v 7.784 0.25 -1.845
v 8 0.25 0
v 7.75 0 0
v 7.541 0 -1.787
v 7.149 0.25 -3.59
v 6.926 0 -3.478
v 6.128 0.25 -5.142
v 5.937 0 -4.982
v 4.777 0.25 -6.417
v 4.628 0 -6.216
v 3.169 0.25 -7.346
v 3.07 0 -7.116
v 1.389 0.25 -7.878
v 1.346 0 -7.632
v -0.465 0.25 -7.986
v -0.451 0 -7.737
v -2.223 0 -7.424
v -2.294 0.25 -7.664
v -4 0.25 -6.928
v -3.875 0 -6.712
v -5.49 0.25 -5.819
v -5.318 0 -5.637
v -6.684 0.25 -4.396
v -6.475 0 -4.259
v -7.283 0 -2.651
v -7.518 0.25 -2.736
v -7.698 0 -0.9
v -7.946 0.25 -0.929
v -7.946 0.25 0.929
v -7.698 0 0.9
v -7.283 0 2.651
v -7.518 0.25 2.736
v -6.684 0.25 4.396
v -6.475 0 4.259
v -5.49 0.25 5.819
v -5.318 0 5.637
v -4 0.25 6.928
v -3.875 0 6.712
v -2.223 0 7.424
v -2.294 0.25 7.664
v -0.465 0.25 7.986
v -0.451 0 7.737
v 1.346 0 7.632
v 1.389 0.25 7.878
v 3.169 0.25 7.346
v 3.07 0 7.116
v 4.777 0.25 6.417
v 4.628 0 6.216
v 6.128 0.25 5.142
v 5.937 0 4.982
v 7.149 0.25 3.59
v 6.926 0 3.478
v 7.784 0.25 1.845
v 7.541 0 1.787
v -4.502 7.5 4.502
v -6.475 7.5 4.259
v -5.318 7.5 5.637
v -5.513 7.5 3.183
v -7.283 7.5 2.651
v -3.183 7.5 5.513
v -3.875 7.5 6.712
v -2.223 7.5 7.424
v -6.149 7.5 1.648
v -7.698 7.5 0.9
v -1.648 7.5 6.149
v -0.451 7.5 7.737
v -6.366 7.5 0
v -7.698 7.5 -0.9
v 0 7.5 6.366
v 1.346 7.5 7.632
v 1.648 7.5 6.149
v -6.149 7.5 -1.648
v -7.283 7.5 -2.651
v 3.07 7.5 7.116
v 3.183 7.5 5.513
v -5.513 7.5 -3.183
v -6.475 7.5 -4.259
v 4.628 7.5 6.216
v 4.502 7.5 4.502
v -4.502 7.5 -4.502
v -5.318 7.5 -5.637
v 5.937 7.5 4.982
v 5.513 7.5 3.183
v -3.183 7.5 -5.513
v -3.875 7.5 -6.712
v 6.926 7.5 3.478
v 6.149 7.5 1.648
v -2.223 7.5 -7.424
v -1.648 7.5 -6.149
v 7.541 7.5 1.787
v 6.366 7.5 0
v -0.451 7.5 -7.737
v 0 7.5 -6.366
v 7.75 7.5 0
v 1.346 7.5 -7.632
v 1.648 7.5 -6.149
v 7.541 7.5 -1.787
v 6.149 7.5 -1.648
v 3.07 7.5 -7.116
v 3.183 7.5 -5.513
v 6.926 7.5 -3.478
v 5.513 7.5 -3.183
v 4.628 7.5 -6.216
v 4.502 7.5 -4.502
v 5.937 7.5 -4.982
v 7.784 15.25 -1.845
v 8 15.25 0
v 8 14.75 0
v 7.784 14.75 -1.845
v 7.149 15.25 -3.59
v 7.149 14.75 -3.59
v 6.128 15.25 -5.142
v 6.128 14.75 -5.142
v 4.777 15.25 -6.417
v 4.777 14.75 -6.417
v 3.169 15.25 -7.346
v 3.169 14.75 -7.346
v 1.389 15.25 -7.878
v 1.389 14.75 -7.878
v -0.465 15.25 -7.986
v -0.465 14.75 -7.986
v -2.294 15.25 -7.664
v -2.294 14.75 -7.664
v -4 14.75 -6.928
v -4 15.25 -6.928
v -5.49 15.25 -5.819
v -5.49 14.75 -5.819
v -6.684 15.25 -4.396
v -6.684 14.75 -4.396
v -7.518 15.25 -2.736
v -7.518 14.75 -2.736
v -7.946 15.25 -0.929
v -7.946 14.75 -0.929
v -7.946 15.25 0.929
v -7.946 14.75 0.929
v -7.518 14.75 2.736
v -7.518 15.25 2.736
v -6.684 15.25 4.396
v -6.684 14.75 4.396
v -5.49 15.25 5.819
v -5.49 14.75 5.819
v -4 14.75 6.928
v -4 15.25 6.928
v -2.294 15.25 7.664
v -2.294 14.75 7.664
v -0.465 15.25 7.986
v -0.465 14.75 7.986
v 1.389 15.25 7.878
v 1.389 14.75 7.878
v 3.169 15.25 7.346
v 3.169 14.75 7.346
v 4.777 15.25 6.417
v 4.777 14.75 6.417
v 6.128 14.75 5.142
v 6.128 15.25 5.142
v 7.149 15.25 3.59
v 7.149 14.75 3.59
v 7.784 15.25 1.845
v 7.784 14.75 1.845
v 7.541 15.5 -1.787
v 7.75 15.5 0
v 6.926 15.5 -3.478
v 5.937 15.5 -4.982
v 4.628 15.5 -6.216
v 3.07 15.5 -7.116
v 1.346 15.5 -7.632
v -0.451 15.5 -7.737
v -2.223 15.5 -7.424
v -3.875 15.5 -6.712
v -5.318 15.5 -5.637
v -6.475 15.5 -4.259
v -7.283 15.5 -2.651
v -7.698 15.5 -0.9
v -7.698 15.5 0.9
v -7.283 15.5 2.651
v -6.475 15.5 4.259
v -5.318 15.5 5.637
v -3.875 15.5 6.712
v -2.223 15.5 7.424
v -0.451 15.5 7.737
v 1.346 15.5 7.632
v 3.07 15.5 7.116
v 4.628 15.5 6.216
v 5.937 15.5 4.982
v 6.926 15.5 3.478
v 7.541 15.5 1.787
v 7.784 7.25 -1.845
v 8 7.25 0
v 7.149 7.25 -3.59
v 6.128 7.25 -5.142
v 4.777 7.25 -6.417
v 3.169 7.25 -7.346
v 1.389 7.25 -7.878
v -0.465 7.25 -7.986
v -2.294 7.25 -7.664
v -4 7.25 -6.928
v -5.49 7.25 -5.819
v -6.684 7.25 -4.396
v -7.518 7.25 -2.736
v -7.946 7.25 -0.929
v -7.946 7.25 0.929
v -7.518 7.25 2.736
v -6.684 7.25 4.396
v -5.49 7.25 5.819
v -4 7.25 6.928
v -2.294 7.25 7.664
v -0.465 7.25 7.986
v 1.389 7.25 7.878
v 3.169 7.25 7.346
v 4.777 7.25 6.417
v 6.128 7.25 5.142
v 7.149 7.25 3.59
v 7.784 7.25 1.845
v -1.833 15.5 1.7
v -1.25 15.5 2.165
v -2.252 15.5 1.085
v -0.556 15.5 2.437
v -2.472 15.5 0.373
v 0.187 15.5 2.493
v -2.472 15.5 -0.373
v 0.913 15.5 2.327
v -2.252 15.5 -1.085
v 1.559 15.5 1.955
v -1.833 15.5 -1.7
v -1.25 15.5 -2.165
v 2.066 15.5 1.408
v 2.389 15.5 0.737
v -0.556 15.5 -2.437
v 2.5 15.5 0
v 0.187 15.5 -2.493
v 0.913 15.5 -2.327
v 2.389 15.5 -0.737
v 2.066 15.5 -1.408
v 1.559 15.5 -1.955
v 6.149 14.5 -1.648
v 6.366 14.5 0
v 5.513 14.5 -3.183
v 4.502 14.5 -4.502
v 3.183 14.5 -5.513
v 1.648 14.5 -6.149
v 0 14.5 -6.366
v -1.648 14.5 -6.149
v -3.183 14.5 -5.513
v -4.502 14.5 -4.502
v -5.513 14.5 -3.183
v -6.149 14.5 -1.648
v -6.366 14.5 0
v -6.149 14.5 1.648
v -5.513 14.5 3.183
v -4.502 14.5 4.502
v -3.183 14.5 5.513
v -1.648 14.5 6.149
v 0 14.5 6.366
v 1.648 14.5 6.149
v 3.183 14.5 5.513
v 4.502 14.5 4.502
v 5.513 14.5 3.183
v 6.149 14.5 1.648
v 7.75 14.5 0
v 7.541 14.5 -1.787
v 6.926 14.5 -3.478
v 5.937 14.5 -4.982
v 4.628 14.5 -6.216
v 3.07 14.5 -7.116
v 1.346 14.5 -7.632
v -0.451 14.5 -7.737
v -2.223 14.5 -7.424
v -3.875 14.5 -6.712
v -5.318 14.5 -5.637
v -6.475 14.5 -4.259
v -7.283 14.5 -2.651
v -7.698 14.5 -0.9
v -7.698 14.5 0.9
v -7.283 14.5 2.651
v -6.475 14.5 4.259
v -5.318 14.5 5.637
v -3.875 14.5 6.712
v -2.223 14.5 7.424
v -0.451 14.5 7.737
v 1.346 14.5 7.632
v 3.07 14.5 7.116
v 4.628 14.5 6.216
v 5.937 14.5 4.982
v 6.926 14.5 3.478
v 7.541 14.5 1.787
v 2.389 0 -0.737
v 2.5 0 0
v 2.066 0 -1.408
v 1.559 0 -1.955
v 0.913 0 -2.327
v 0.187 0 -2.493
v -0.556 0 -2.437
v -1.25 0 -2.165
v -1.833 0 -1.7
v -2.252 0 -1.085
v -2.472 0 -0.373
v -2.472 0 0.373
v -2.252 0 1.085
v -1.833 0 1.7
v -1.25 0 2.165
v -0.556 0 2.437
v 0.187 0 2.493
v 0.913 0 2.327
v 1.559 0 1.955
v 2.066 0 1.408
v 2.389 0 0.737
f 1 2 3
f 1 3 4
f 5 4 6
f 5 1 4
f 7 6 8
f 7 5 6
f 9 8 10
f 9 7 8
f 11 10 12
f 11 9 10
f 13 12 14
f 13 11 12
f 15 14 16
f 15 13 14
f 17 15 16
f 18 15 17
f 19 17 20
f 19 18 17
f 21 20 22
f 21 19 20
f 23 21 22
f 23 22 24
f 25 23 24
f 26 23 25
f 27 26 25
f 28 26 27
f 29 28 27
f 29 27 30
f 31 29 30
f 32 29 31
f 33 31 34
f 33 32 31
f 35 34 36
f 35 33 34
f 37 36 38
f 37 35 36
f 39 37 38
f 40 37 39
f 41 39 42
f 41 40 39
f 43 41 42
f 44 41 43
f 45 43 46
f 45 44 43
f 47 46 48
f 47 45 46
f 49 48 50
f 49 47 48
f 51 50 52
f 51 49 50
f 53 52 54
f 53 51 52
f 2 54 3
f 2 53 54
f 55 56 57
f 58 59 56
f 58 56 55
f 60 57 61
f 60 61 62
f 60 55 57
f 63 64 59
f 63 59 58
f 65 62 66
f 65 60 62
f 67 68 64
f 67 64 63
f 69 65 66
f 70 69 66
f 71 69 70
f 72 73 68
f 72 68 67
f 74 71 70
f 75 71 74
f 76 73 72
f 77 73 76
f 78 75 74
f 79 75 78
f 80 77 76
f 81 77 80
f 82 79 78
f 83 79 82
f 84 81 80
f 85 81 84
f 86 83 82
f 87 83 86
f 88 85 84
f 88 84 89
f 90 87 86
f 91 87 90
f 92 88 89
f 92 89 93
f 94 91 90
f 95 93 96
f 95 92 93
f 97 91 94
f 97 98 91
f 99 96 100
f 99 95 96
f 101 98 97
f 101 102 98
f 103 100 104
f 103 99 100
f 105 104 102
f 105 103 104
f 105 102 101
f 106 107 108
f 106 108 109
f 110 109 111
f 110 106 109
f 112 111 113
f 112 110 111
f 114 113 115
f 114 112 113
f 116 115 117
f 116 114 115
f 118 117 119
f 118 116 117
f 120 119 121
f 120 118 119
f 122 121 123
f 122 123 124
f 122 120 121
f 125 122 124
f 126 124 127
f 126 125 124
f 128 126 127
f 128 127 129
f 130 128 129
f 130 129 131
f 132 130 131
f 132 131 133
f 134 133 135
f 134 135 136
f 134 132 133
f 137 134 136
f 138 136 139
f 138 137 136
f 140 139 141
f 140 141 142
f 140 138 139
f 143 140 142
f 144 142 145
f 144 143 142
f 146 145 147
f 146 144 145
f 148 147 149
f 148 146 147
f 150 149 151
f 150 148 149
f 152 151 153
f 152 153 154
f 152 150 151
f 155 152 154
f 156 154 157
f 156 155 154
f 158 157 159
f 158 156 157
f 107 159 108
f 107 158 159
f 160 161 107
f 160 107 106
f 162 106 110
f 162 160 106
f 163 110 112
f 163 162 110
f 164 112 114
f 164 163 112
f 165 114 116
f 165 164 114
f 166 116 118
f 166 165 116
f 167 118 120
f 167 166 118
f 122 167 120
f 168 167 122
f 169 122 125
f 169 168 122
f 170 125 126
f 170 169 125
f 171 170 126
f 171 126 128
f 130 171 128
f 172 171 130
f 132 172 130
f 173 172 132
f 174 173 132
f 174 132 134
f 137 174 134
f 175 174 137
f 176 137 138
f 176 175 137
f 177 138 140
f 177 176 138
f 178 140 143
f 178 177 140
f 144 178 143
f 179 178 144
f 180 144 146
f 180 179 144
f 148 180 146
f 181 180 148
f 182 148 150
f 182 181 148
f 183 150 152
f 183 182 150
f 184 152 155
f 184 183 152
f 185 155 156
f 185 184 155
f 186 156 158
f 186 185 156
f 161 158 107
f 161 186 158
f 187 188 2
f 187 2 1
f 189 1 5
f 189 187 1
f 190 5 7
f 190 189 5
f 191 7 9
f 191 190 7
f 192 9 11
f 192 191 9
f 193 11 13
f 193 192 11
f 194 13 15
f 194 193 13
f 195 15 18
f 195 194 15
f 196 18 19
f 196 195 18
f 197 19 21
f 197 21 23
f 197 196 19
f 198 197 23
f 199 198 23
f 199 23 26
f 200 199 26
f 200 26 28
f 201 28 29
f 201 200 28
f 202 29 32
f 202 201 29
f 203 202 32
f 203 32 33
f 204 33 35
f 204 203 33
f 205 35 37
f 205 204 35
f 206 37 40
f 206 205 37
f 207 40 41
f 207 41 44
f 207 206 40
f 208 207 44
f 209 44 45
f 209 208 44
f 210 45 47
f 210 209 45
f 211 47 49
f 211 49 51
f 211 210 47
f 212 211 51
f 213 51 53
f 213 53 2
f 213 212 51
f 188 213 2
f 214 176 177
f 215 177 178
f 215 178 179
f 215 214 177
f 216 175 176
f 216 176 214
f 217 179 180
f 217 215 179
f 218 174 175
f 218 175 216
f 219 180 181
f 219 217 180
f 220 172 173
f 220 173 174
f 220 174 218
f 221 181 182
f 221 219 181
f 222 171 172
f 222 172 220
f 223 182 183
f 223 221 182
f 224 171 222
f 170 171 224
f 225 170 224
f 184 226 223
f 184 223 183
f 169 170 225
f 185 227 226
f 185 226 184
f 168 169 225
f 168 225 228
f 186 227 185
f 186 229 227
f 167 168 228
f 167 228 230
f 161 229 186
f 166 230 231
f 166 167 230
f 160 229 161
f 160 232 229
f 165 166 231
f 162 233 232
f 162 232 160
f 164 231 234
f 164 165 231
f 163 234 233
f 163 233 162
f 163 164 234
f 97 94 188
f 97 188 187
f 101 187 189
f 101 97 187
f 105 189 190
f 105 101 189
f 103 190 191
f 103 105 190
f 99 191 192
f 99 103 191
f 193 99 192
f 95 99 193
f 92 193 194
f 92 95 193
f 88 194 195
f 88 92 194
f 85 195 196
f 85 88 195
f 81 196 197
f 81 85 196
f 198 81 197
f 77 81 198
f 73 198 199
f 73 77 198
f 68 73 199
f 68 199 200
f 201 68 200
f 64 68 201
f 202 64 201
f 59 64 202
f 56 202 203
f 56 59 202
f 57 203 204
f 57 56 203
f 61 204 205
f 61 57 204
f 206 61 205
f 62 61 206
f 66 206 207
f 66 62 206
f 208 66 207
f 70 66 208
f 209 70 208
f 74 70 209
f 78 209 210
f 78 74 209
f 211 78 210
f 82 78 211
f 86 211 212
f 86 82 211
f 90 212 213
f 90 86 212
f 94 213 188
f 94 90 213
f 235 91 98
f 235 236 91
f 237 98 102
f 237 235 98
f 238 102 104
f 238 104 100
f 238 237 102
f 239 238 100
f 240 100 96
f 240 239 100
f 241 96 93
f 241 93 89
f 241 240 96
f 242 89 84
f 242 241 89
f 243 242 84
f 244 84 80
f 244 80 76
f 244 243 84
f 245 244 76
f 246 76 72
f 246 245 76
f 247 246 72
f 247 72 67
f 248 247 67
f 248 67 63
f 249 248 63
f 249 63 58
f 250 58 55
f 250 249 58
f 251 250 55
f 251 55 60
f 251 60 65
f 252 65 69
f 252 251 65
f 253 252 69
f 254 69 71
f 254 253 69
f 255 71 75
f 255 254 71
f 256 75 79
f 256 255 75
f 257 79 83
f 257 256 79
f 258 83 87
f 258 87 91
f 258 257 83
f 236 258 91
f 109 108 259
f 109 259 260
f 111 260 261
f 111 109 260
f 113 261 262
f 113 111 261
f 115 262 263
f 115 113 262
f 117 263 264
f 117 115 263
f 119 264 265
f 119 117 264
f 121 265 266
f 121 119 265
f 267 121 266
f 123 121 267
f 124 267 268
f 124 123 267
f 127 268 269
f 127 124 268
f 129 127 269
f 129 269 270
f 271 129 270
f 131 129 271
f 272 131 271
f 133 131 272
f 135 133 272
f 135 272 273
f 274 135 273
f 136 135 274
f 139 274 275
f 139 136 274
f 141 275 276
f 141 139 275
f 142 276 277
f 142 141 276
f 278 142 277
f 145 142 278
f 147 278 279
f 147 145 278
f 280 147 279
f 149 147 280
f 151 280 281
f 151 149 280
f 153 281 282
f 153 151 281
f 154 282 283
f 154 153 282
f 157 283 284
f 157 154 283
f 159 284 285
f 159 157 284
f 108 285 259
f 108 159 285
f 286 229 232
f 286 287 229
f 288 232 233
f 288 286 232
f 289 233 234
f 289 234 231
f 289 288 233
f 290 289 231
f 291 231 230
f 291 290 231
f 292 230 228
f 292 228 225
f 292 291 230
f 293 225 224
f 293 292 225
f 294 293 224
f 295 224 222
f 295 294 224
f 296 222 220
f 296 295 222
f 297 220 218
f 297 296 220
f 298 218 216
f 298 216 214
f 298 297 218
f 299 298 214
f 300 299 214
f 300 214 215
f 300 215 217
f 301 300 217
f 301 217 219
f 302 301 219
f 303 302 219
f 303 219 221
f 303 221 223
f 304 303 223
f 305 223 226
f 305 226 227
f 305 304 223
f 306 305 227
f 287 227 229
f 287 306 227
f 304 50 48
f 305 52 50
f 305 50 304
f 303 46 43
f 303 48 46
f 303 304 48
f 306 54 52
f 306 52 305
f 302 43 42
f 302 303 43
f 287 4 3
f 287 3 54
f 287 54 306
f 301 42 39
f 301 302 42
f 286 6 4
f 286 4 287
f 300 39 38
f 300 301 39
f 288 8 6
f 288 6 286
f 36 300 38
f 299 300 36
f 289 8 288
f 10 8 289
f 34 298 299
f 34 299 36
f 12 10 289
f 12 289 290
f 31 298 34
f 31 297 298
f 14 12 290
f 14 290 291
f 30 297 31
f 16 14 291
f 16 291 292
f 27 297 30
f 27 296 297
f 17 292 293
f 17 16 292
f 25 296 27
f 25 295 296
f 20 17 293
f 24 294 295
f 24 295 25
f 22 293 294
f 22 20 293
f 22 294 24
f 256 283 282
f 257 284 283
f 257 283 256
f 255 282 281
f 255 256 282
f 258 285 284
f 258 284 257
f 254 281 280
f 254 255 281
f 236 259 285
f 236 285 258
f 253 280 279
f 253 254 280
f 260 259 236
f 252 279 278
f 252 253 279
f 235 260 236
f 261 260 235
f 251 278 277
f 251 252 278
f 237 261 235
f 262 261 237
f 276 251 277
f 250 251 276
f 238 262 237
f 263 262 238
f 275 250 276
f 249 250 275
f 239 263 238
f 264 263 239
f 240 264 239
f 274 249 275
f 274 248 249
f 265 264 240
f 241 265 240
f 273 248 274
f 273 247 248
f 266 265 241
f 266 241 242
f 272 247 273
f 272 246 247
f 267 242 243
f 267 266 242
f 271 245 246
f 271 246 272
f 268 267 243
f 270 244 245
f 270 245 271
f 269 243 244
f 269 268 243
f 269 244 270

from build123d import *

# Parameters (mm, degrees)
CHAMFER1_SIZE = 0.25


with BuildPart() as part:
    # Sketch4 → Revolve2 (revolve)
    with BuildSketch(Plane.XY):
        Polygon((2.5, 0), (8, 0), (8, 7.5), (6.366197724, 7.5), (6.366197724, 14.5), (8, 14.5), (8, 15.5), (2.5, 15.5), align=None)
    revolve(axis=Axis((0, 0, 0), (0, 1, 0)))

    # Chamfer1
    chamfer1_edges = [part.edges().sort_by_distance(p)[0] for p in [
        (-8, 15.5, 0),
        (-8, 14.5, 0),
        (-8, 7.5, 0),
        (-8, 0, 0),
    ]]
    chamfer(chamfer1_edges, length=CHAMFER1_SIZE)


solid = part.part
